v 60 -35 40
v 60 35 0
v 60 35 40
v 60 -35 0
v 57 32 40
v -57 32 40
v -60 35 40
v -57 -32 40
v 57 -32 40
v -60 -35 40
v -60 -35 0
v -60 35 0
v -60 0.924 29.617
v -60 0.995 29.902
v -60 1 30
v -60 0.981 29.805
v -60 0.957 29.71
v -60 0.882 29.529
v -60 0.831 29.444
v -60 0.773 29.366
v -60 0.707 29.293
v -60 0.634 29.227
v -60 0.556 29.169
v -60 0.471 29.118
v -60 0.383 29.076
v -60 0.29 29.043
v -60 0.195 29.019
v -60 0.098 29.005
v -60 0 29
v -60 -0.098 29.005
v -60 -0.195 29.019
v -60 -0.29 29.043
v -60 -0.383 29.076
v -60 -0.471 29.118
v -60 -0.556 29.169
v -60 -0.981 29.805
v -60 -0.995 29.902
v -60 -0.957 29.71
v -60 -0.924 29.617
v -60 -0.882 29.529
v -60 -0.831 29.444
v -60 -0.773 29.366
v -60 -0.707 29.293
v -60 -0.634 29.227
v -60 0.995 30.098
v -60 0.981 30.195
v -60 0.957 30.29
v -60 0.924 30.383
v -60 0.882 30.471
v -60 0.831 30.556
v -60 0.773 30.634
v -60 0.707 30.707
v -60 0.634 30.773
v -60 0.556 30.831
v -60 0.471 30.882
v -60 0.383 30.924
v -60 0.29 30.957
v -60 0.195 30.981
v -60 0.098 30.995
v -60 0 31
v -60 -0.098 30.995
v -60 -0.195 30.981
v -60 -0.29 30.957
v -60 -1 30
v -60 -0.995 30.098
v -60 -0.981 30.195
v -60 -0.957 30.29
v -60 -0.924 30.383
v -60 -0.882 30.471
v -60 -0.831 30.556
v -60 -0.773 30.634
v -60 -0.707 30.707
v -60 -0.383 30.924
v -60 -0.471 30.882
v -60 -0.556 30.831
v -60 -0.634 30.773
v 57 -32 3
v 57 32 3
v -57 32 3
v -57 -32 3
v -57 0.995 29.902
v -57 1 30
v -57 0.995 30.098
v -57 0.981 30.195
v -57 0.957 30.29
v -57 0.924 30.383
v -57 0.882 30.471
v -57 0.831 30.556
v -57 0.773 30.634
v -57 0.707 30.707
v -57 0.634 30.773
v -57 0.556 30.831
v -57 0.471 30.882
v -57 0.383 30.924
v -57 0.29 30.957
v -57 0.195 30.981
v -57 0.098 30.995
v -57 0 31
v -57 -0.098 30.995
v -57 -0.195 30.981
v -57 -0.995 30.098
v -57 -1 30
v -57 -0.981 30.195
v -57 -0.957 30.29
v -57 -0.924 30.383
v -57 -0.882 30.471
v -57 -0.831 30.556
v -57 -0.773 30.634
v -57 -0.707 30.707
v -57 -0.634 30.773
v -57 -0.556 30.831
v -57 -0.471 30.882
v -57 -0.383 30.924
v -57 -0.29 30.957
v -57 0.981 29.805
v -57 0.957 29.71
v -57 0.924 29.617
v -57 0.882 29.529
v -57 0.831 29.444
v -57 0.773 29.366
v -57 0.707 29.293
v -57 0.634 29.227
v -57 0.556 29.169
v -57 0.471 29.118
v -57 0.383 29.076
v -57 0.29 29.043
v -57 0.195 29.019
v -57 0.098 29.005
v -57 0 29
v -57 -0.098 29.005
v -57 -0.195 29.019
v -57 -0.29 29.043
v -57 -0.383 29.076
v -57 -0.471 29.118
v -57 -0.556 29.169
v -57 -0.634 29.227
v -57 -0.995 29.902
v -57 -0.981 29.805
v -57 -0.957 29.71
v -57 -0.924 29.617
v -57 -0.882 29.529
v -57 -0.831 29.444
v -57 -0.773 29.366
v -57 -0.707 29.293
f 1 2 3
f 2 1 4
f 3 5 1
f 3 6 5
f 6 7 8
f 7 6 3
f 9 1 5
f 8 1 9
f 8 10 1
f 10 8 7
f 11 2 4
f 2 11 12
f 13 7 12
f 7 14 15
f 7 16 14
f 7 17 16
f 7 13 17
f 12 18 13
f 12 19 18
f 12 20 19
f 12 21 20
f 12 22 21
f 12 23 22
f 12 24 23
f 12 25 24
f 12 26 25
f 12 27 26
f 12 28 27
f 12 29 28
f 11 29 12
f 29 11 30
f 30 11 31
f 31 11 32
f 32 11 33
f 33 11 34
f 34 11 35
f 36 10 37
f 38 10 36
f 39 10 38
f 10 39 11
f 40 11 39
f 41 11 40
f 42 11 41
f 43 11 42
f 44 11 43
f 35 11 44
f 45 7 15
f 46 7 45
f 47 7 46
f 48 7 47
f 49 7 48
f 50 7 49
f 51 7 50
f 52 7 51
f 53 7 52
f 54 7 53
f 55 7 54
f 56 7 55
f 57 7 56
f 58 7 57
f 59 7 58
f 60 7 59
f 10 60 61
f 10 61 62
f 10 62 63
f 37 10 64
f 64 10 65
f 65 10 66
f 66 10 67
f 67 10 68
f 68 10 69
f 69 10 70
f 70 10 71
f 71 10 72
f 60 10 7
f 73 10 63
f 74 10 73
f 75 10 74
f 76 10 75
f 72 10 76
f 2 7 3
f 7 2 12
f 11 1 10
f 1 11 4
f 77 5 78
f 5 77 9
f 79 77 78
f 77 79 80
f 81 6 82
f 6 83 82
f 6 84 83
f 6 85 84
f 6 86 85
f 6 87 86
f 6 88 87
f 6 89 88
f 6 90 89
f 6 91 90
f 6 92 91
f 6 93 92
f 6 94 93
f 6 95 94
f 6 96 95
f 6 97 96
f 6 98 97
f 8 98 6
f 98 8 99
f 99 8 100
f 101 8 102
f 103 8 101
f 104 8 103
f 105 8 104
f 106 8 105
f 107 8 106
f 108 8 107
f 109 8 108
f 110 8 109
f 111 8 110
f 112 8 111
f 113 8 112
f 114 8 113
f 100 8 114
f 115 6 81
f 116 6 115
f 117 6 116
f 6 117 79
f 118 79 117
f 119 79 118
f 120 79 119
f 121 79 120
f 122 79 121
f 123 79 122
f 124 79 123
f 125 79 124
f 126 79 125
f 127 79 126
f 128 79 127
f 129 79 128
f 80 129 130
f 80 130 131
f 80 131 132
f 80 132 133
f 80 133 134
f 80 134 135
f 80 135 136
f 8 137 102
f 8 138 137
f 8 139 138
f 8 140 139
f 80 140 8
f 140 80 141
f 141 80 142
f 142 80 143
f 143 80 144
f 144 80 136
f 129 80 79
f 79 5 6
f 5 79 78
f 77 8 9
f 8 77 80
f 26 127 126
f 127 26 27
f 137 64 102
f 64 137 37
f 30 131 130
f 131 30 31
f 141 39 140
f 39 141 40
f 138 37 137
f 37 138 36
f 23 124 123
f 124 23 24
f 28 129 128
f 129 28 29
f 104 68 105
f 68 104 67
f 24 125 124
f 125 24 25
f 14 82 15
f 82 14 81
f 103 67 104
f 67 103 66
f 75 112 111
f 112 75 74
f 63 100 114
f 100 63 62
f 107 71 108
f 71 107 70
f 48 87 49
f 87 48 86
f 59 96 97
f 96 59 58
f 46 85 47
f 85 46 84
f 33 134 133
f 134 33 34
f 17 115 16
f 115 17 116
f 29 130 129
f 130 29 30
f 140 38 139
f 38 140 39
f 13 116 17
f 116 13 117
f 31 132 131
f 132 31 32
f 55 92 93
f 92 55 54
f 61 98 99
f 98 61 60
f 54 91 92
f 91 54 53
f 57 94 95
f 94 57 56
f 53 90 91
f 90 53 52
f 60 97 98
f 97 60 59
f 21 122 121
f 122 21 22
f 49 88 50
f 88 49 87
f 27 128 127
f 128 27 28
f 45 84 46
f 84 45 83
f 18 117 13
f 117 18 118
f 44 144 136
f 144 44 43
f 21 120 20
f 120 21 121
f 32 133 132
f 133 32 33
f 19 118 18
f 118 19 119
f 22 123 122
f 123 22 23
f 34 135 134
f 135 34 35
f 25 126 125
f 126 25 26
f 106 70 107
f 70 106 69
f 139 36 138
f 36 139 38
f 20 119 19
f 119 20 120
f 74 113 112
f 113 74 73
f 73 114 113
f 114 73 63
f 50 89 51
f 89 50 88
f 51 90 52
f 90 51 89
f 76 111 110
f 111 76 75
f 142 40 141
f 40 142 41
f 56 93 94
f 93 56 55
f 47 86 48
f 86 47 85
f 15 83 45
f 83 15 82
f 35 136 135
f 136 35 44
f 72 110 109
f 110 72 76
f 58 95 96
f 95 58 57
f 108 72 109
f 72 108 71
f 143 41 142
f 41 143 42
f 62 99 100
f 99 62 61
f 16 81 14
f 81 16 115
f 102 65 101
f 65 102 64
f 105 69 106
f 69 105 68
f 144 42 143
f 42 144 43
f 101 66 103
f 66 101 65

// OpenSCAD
// --- Dimensions (mm) ---
outer_x = 120;          // Total length of the tank
outer_y = 70;           // Total width of the tank
outer_z = 40;           // Total height of the tank

wall_thickness = 3;     // Thickness of the walls and floor
floor_thickness = 3;    // Thickness of the floor

platform_length = 60;   // Length of the central platform (X direction)
platform_height = 13;   // Height of the platform top from the inner floor
platform_width = outer_y - (2 * wall_thickness); // Spans full inner width

hole_diameter = 2;      // Diameter of electrode wire holes
hole_y_pos = 0;         // Y position of holes (centered on Y axis)
hole_z_pos = 30;        // Z position of holes (measured from the bottom of the tank)

// --- Resolution ---
$fn = 64;

// --- Model Construction ---

// The part is built starting from Z=0 to ensure it rests on the XY plane.
// We use a union of the shell and platform, then subtract the cavity and holes.

module tank_geometry() {
    difference() {
        // 1. The Solid Body (Outer shell + Internal Platform)
        union() {
            // The main outer block
            cube([outer_x, outer_y, outer_z]);

            // The Platform
            // The platform is centered in X.
            // Its top is at: floor_thickness + platform_height
            // Its bottom is at: floor_thickness
            // Its height is: platform_height
            // To center it in Y: (outer_y - platform_width) / 2
            translate([
                (outer_x - platform_length) / 2, 
                (outer_y - platform_width) / 2, 
                floor_thickness
            ])
            cube([platform_length, platform_width, platform_height]);
        }

        // 2. The Inner Cavity (The space where buffer goes)
        // We subtract the void from the floor_thickness up to the top.
        // We extend the subtraction slightly to ensure the top is open.
        translate([wall_thickness, wall_thickness, floor_thickness])
            cube([outer_x - 2*wall_thickness, outer_y - 2*wall_thickness, outer_z + 0.1]);

        // 3. The Electrode Holes
        // The user specified holes through the X-end walls at y=0, z=30.
        // In our coordinate system (0,0,0 is a corner), the center of the tank is at Y = outer_y/2.
        // The user's "y=0" refers to the center of the Y-axis of the tank.
        // Therefore, the hole is at Y = outer_y / 2.
        // The hole is at Z = 30.
        // We drill through the X-axis (the length of the tank).
        
        // We use a loop to ensure the hole is cut through both end walls.
        // We use a single long cylinder to ensure it cuts through the entire X-span.
        translate([0, outer_y/2, hole_z_pos])
            rotate([0, 90, 0])
                cylinder(d = hole_diameter, h = outer_x + 2, center = true);
    }
}

// Final Assembly:
// The geometry is built from (0,0,0) as the corner.
// To center it on the X and Y axes as per the prompt:
translate([-outer_x/2, -outer_y/2, 0])
    tank_geometry();

// --- Verification of logic ---
// 1. Dimensions: 120x70x40. Correct.
// 2. Walls/Floor: 3mm. Correct.
// 3. Platform: 60mm long, spans full inner width, top is 13mm above inner floor. Correct.
// 4. Holes: 2mm diameter, at Y=0 (tank center), Z=30 (from bottom). Correct.
// 5. Orientation: Rests on XY plane at Z=0. Correct.
